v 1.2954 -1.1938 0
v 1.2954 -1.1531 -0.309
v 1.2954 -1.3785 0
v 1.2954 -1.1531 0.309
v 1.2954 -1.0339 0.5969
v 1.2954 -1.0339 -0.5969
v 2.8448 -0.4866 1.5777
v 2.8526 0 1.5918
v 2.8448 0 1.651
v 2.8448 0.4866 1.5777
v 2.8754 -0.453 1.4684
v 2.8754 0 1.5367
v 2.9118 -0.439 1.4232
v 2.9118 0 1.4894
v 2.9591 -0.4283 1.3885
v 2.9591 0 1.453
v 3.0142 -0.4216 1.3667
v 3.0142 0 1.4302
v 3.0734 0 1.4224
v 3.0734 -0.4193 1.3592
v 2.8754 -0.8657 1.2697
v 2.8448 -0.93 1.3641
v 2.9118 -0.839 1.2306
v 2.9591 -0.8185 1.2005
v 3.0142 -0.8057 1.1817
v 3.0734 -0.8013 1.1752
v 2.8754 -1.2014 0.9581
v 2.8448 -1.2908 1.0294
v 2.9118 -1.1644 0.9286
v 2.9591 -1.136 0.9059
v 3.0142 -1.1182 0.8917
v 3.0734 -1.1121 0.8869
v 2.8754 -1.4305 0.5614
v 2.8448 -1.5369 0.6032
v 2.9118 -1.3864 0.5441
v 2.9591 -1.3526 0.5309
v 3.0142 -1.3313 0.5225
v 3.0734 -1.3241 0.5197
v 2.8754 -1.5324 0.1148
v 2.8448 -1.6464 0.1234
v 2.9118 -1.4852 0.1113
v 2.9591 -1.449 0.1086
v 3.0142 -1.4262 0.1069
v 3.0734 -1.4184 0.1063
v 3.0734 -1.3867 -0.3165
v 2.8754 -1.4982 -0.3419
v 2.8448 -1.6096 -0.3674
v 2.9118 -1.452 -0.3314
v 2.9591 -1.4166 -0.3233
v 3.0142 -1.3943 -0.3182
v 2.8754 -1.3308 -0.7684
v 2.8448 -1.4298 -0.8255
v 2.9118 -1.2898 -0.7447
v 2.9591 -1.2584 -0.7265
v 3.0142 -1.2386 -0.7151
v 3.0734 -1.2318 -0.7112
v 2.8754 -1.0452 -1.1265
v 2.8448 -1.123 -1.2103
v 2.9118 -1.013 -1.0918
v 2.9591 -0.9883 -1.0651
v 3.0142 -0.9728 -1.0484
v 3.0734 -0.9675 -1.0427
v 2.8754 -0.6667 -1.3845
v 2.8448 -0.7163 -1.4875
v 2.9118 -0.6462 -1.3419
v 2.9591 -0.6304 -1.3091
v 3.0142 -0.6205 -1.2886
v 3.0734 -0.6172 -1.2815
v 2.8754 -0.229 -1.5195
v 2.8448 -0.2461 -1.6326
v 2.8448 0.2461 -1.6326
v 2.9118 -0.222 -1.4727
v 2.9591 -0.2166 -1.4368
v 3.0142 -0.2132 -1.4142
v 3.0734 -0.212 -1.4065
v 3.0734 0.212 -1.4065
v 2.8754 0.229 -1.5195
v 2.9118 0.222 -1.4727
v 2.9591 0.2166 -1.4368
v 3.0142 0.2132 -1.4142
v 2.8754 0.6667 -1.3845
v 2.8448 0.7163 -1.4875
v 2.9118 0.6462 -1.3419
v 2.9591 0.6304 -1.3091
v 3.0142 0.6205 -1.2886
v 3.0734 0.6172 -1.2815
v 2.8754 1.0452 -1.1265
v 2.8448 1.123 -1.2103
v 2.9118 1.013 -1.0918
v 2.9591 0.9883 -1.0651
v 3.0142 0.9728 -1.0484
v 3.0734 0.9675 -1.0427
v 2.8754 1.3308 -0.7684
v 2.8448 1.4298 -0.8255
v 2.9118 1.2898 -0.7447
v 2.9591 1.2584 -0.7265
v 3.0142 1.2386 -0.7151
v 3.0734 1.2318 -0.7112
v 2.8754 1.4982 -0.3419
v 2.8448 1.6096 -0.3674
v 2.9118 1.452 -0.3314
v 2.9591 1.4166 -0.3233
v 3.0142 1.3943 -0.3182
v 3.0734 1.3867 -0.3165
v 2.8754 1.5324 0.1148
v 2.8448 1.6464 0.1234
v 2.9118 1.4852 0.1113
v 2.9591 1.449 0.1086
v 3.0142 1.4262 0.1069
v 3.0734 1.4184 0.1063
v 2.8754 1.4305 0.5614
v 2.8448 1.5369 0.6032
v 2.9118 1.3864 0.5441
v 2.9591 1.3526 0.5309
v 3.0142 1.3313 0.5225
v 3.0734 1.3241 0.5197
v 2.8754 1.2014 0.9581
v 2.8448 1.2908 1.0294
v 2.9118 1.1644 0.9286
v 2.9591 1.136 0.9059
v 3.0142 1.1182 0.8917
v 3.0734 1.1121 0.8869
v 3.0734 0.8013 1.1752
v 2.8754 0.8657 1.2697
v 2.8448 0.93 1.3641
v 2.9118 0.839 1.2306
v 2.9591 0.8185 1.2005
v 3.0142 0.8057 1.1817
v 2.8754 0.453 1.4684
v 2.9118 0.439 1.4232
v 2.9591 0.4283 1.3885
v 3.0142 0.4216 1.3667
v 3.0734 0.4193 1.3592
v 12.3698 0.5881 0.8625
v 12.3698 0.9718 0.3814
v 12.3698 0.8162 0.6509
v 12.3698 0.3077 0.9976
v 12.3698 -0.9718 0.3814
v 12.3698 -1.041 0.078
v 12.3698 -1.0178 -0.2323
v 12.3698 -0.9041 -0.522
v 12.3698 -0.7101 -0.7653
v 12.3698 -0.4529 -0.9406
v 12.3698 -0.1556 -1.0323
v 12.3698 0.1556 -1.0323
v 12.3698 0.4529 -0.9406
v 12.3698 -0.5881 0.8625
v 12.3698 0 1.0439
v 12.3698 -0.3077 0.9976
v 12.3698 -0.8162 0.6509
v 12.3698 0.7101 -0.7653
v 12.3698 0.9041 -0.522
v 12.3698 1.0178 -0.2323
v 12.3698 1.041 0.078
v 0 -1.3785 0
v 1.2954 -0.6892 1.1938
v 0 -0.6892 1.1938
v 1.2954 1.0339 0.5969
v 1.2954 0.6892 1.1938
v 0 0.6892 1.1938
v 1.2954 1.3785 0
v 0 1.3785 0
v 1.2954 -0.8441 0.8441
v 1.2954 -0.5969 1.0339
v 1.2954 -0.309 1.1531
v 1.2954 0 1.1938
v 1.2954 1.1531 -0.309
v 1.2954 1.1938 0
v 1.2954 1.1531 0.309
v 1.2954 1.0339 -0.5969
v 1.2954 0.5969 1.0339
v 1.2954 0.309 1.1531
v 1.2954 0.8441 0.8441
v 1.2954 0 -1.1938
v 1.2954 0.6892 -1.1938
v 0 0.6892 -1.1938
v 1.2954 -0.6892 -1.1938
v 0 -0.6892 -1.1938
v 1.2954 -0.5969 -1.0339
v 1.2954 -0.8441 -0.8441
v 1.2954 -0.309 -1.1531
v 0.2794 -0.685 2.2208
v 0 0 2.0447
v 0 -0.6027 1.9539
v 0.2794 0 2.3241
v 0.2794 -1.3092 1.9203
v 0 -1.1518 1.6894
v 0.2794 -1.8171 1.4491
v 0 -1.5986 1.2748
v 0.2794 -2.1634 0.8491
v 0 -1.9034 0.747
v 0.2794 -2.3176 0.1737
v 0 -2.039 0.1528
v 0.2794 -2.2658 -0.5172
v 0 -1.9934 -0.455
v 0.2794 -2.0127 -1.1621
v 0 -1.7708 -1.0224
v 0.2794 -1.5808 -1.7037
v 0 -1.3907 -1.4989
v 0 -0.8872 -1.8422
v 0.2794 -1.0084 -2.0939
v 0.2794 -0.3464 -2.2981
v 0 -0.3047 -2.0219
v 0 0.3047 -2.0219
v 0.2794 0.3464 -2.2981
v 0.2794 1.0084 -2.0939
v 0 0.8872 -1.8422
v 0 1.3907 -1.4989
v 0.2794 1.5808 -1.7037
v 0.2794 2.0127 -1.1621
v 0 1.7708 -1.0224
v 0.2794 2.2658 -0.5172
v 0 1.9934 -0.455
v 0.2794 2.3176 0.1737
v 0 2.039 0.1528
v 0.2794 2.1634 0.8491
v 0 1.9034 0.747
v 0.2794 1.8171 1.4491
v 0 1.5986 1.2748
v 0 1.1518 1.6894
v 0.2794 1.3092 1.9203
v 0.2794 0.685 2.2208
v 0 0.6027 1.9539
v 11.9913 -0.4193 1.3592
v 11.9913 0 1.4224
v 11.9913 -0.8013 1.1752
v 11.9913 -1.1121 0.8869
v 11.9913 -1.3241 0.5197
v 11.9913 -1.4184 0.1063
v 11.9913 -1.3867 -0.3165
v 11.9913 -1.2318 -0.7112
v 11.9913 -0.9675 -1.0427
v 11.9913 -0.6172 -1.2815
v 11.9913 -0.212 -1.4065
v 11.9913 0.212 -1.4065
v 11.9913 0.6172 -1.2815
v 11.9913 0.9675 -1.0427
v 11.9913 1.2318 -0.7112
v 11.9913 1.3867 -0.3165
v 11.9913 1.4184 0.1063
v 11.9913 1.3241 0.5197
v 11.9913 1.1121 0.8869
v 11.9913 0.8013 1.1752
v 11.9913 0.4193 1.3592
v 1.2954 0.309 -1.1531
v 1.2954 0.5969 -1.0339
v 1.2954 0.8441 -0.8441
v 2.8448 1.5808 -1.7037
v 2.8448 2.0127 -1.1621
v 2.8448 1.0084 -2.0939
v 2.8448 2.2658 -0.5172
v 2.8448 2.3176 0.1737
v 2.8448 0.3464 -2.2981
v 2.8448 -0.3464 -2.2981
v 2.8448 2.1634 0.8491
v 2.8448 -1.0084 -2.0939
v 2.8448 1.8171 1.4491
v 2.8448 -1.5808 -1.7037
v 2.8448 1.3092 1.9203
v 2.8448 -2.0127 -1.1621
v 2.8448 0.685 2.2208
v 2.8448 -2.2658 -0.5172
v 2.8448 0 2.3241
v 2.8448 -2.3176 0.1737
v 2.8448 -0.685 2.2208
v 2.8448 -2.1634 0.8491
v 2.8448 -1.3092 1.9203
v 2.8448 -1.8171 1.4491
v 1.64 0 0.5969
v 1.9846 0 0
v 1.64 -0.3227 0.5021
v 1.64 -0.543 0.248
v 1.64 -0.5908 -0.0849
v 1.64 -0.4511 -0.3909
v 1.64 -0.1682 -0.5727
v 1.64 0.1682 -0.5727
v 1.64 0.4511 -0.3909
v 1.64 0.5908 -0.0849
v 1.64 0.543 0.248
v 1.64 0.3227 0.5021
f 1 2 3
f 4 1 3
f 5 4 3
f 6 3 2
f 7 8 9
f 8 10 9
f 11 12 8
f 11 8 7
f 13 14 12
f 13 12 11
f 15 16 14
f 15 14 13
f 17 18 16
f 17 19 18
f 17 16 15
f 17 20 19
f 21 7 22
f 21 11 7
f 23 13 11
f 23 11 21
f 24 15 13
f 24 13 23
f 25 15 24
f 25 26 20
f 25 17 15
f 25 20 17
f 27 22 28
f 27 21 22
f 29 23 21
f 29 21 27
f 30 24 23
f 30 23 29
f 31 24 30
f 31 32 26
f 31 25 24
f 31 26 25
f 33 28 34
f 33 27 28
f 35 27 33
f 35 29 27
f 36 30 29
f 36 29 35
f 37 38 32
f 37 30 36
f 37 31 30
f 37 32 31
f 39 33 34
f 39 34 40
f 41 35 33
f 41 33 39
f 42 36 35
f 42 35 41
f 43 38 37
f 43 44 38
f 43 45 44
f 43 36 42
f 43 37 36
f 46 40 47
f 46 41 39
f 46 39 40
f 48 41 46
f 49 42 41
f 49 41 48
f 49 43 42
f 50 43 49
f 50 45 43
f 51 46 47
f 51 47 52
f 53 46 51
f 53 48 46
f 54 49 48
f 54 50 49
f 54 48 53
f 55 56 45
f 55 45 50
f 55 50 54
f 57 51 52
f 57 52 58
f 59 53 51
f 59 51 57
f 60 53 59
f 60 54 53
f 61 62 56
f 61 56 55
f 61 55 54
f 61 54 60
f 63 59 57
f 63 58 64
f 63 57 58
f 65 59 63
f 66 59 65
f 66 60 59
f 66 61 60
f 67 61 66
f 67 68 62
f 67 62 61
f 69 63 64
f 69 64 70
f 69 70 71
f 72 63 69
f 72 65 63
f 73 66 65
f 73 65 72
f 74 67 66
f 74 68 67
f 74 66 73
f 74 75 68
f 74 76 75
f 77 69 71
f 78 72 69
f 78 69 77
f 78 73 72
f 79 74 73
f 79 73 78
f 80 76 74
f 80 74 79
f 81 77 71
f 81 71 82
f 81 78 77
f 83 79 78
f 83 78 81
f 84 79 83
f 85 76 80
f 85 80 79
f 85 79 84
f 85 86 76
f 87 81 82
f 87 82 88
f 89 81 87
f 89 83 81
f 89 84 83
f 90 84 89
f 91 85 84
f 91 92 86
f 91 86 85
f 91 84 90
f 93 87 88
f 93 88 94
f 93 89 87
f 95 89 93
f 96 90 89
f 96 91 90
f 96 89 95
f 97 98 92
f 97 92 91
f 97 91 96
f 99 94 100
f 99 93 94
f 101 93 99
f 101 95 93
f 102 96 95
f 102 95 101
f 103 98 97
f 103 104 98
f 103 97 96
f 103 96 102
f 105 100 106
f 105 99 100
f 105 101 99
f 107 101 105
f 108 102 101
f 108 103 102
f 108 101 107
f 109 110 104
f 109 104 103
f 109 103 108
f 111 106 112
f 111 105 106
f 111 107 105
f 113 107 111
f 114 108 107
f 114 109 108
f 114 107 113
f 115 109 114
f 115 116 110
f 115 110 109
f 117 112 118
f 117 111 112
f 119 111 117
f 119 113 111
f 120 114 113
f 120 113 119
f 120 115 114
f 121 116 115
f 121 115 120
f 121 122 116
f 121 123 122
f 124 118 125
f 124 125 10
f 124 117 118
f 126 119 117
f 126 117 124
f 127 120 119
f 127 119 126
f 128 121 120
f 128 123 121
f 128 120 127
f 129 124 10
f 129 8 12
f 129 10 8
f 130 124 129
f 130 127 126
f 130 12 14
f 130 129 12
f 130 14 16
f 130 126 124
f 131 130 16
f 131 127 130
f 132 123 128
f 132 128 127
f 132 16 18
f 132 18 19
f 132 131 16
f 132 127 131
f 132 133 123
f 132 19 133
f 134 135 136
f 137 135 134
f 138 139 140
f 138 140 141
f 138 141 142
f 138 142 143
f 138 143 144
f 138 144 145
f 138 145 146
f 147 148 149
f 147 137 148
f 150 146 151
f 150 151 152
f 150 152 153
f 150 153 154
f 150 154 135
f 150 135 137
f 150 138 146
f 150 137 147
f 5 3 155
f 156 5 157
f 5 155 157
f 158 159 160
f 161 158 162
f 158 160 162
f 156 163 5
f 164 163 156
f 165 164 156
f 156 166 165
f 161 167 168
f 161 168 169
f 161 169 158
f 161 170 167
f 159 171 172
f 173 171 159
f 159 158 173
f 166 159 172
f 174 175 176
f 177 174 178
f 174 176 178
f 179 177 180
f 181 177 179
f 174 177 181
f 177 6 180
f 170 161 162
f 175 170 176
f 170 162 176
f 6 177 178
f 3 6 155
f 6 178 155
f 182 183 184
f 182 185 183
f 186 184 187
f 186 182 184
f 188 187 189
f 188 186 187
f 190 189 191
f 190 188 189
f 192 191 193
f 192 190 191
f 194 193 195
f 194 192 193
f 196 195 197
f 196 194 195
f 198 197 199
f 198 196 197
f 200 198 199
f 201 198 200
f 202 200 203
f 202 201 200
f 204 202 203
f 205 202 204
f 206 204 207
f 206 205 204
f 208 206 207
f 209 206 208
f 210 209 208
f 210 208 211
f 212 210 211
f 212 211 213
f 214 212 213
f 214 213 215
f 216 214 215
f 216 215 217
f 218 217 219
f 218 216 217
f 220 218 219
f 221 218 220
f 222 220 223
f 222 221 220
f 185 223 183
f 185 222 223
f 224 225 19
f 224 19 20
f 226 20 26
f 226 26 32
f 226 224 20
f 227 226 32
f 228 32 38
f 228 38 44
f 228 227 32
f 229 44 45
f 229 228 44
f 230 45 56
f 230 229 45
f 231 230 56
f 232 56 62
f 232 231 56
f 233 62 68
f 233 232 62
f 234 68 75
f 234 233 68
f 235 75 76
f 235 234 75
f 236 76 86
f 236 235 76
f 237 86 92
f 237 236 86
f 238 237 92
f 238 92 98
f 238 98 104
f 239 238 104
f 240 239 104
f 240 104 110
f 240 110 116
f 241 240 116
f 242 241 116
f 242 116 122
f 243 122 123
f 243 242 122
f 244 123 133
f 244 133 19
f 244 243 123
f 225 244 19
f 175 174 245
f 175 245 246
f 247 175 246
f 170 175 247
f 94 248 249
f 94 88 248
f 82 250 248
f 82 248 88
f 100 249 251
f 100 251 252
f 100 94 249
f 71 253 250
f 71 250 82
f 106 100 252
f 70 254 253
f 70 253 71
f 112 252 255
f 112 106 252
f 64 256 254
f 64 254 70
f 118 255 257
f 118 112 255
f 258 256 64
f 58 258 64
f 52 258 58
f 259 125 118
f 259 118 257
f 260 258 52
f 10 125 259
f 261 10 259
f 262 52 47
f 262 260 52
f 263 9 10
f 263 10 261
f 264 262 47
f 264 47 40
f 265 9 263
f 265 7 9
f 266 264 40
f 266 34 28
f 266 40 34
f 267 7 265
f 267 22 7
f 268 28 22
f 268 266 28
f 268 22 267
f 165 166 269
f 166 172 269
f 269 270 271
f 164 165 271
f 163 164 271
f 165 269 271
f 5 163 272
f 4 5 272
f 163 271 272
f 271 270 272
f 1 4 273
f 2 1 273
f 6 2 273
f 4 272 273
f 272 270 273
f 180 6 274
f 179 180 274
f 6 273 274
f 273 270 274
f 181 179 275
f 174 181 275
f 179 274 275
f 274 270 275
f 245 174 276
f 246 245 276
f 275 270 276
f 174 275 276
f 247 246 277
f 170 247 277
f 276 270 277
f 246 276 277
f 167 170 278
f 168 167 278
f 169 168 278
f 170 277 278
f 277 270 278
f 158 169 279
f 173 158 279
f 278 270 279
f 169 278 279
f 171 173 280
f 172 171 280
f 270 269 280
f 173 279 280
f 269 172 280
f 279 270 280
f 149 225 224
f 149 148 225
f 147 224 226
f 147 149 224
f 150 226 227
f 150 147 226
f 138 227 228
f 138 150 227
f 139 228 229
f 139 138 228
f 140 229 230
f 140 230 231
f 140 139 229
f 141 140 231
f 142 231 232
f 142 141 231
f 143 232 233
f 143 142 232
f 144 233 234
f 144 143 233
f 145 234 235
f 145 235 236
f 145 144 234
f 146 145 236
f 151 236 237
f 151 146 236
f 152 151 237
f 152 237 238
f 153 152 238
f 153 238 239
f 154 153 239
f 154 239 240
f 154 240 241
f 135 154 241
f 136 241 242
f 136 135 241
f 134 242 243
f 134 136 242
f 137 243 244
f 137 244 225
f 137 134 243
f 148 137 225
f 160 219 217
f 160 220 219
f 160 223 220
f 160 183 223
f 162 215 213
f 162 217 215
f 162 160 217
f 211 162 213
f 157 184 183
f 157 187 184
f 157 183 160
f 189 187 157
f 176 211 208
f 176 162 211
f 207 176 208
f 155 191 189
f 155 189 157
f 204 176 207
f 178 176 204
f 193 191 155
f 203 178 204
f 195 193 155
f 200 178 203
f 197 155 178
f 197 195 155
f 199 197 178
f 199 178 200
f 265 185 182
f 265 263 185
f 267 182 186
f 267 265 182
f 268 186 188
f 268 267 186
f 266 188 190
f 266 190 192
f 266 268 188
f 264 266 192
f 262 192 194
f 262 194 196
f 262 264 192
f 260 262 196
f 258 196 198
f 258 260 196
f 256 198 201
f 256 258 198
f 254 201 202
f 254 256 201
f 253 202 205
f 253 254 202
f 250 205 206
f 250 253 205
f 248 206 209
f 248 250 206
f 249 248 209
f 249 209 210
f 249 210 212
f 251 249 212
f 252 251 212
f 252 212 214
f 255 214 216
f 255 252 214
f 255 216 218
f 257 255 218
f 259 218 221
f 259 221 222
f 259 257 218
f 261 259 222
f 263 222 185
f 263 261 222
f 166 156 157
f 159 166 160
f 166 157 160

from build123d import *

# Parameters (mm, degrees)
FILLET1_R   = 0.2286
HEX_2_DEPTH = 1.2954


with BuildPart() as part:
    # BodySke → Base-Revolve (revolve)
    with BuildSketch(Plane.XY, mode=Mode.PRIVATE) as base_revolve_sk:
        Polygon((0, 0), (0, 2.0447), (0.2794, 2.3241), (2.8448, 2.3241), (2.8448, 1.4224), (11.99134, 1.4224), (12.3698, 1.04394), (12.3698, 0), align=None)
    revolve(base_revolve_sk.sketch.rotate(Axis((-31.75, 0, 0), (1, 0, 0)), 90), axis=Axis((-31.75, 0, 0), (1, 0, 0)))

    # Fillet1
    fillet1_edges = [part.edges().sort_by_distance(p)[0] for p in [
        (2.8448, 0, -1.4224),
    ]]
    fillet(fillet1_edges, radius=FILLET1_R)

    # Sketch2 → Hex-PreBroach (revolve, cut)
    with BuildSketch(Plane.XY, mode=Mode.PRIVATE) as hex_prebroach_sk:
        Polygon((0, 1.1938), (1.2954, 1.1938), (1.984640751, 0), (0, 0), align=None)
    revolve(hex_prebroach_sk.sketch.rotate(Axis((0, 0, 0), (1, 0, 0)), 90), axis=Axis((0, 0, 0), (1, 0, 0)), mode=Mode.SUBTRACT)

    # Sketch3 → Hex 2 (cut)
    with BuildSketch(Plane(origin=(0, 0, 0), x_dir=(0, 0.500000000000001, 0.866025403784438), z_dir=(-1, 0, 0))):
        Polygon((0.689240751, 1.1938), (-0.689240751, 1.1938), (-1.378481503, 0), (-0.689240751, -1.1938), (0.689240751, -1.1938), (1.378481503, 0), align=None)
    extrude(amount=-HEX_2_DEPTH, mode=Mode.SUBTRACT)


solid = part.part
